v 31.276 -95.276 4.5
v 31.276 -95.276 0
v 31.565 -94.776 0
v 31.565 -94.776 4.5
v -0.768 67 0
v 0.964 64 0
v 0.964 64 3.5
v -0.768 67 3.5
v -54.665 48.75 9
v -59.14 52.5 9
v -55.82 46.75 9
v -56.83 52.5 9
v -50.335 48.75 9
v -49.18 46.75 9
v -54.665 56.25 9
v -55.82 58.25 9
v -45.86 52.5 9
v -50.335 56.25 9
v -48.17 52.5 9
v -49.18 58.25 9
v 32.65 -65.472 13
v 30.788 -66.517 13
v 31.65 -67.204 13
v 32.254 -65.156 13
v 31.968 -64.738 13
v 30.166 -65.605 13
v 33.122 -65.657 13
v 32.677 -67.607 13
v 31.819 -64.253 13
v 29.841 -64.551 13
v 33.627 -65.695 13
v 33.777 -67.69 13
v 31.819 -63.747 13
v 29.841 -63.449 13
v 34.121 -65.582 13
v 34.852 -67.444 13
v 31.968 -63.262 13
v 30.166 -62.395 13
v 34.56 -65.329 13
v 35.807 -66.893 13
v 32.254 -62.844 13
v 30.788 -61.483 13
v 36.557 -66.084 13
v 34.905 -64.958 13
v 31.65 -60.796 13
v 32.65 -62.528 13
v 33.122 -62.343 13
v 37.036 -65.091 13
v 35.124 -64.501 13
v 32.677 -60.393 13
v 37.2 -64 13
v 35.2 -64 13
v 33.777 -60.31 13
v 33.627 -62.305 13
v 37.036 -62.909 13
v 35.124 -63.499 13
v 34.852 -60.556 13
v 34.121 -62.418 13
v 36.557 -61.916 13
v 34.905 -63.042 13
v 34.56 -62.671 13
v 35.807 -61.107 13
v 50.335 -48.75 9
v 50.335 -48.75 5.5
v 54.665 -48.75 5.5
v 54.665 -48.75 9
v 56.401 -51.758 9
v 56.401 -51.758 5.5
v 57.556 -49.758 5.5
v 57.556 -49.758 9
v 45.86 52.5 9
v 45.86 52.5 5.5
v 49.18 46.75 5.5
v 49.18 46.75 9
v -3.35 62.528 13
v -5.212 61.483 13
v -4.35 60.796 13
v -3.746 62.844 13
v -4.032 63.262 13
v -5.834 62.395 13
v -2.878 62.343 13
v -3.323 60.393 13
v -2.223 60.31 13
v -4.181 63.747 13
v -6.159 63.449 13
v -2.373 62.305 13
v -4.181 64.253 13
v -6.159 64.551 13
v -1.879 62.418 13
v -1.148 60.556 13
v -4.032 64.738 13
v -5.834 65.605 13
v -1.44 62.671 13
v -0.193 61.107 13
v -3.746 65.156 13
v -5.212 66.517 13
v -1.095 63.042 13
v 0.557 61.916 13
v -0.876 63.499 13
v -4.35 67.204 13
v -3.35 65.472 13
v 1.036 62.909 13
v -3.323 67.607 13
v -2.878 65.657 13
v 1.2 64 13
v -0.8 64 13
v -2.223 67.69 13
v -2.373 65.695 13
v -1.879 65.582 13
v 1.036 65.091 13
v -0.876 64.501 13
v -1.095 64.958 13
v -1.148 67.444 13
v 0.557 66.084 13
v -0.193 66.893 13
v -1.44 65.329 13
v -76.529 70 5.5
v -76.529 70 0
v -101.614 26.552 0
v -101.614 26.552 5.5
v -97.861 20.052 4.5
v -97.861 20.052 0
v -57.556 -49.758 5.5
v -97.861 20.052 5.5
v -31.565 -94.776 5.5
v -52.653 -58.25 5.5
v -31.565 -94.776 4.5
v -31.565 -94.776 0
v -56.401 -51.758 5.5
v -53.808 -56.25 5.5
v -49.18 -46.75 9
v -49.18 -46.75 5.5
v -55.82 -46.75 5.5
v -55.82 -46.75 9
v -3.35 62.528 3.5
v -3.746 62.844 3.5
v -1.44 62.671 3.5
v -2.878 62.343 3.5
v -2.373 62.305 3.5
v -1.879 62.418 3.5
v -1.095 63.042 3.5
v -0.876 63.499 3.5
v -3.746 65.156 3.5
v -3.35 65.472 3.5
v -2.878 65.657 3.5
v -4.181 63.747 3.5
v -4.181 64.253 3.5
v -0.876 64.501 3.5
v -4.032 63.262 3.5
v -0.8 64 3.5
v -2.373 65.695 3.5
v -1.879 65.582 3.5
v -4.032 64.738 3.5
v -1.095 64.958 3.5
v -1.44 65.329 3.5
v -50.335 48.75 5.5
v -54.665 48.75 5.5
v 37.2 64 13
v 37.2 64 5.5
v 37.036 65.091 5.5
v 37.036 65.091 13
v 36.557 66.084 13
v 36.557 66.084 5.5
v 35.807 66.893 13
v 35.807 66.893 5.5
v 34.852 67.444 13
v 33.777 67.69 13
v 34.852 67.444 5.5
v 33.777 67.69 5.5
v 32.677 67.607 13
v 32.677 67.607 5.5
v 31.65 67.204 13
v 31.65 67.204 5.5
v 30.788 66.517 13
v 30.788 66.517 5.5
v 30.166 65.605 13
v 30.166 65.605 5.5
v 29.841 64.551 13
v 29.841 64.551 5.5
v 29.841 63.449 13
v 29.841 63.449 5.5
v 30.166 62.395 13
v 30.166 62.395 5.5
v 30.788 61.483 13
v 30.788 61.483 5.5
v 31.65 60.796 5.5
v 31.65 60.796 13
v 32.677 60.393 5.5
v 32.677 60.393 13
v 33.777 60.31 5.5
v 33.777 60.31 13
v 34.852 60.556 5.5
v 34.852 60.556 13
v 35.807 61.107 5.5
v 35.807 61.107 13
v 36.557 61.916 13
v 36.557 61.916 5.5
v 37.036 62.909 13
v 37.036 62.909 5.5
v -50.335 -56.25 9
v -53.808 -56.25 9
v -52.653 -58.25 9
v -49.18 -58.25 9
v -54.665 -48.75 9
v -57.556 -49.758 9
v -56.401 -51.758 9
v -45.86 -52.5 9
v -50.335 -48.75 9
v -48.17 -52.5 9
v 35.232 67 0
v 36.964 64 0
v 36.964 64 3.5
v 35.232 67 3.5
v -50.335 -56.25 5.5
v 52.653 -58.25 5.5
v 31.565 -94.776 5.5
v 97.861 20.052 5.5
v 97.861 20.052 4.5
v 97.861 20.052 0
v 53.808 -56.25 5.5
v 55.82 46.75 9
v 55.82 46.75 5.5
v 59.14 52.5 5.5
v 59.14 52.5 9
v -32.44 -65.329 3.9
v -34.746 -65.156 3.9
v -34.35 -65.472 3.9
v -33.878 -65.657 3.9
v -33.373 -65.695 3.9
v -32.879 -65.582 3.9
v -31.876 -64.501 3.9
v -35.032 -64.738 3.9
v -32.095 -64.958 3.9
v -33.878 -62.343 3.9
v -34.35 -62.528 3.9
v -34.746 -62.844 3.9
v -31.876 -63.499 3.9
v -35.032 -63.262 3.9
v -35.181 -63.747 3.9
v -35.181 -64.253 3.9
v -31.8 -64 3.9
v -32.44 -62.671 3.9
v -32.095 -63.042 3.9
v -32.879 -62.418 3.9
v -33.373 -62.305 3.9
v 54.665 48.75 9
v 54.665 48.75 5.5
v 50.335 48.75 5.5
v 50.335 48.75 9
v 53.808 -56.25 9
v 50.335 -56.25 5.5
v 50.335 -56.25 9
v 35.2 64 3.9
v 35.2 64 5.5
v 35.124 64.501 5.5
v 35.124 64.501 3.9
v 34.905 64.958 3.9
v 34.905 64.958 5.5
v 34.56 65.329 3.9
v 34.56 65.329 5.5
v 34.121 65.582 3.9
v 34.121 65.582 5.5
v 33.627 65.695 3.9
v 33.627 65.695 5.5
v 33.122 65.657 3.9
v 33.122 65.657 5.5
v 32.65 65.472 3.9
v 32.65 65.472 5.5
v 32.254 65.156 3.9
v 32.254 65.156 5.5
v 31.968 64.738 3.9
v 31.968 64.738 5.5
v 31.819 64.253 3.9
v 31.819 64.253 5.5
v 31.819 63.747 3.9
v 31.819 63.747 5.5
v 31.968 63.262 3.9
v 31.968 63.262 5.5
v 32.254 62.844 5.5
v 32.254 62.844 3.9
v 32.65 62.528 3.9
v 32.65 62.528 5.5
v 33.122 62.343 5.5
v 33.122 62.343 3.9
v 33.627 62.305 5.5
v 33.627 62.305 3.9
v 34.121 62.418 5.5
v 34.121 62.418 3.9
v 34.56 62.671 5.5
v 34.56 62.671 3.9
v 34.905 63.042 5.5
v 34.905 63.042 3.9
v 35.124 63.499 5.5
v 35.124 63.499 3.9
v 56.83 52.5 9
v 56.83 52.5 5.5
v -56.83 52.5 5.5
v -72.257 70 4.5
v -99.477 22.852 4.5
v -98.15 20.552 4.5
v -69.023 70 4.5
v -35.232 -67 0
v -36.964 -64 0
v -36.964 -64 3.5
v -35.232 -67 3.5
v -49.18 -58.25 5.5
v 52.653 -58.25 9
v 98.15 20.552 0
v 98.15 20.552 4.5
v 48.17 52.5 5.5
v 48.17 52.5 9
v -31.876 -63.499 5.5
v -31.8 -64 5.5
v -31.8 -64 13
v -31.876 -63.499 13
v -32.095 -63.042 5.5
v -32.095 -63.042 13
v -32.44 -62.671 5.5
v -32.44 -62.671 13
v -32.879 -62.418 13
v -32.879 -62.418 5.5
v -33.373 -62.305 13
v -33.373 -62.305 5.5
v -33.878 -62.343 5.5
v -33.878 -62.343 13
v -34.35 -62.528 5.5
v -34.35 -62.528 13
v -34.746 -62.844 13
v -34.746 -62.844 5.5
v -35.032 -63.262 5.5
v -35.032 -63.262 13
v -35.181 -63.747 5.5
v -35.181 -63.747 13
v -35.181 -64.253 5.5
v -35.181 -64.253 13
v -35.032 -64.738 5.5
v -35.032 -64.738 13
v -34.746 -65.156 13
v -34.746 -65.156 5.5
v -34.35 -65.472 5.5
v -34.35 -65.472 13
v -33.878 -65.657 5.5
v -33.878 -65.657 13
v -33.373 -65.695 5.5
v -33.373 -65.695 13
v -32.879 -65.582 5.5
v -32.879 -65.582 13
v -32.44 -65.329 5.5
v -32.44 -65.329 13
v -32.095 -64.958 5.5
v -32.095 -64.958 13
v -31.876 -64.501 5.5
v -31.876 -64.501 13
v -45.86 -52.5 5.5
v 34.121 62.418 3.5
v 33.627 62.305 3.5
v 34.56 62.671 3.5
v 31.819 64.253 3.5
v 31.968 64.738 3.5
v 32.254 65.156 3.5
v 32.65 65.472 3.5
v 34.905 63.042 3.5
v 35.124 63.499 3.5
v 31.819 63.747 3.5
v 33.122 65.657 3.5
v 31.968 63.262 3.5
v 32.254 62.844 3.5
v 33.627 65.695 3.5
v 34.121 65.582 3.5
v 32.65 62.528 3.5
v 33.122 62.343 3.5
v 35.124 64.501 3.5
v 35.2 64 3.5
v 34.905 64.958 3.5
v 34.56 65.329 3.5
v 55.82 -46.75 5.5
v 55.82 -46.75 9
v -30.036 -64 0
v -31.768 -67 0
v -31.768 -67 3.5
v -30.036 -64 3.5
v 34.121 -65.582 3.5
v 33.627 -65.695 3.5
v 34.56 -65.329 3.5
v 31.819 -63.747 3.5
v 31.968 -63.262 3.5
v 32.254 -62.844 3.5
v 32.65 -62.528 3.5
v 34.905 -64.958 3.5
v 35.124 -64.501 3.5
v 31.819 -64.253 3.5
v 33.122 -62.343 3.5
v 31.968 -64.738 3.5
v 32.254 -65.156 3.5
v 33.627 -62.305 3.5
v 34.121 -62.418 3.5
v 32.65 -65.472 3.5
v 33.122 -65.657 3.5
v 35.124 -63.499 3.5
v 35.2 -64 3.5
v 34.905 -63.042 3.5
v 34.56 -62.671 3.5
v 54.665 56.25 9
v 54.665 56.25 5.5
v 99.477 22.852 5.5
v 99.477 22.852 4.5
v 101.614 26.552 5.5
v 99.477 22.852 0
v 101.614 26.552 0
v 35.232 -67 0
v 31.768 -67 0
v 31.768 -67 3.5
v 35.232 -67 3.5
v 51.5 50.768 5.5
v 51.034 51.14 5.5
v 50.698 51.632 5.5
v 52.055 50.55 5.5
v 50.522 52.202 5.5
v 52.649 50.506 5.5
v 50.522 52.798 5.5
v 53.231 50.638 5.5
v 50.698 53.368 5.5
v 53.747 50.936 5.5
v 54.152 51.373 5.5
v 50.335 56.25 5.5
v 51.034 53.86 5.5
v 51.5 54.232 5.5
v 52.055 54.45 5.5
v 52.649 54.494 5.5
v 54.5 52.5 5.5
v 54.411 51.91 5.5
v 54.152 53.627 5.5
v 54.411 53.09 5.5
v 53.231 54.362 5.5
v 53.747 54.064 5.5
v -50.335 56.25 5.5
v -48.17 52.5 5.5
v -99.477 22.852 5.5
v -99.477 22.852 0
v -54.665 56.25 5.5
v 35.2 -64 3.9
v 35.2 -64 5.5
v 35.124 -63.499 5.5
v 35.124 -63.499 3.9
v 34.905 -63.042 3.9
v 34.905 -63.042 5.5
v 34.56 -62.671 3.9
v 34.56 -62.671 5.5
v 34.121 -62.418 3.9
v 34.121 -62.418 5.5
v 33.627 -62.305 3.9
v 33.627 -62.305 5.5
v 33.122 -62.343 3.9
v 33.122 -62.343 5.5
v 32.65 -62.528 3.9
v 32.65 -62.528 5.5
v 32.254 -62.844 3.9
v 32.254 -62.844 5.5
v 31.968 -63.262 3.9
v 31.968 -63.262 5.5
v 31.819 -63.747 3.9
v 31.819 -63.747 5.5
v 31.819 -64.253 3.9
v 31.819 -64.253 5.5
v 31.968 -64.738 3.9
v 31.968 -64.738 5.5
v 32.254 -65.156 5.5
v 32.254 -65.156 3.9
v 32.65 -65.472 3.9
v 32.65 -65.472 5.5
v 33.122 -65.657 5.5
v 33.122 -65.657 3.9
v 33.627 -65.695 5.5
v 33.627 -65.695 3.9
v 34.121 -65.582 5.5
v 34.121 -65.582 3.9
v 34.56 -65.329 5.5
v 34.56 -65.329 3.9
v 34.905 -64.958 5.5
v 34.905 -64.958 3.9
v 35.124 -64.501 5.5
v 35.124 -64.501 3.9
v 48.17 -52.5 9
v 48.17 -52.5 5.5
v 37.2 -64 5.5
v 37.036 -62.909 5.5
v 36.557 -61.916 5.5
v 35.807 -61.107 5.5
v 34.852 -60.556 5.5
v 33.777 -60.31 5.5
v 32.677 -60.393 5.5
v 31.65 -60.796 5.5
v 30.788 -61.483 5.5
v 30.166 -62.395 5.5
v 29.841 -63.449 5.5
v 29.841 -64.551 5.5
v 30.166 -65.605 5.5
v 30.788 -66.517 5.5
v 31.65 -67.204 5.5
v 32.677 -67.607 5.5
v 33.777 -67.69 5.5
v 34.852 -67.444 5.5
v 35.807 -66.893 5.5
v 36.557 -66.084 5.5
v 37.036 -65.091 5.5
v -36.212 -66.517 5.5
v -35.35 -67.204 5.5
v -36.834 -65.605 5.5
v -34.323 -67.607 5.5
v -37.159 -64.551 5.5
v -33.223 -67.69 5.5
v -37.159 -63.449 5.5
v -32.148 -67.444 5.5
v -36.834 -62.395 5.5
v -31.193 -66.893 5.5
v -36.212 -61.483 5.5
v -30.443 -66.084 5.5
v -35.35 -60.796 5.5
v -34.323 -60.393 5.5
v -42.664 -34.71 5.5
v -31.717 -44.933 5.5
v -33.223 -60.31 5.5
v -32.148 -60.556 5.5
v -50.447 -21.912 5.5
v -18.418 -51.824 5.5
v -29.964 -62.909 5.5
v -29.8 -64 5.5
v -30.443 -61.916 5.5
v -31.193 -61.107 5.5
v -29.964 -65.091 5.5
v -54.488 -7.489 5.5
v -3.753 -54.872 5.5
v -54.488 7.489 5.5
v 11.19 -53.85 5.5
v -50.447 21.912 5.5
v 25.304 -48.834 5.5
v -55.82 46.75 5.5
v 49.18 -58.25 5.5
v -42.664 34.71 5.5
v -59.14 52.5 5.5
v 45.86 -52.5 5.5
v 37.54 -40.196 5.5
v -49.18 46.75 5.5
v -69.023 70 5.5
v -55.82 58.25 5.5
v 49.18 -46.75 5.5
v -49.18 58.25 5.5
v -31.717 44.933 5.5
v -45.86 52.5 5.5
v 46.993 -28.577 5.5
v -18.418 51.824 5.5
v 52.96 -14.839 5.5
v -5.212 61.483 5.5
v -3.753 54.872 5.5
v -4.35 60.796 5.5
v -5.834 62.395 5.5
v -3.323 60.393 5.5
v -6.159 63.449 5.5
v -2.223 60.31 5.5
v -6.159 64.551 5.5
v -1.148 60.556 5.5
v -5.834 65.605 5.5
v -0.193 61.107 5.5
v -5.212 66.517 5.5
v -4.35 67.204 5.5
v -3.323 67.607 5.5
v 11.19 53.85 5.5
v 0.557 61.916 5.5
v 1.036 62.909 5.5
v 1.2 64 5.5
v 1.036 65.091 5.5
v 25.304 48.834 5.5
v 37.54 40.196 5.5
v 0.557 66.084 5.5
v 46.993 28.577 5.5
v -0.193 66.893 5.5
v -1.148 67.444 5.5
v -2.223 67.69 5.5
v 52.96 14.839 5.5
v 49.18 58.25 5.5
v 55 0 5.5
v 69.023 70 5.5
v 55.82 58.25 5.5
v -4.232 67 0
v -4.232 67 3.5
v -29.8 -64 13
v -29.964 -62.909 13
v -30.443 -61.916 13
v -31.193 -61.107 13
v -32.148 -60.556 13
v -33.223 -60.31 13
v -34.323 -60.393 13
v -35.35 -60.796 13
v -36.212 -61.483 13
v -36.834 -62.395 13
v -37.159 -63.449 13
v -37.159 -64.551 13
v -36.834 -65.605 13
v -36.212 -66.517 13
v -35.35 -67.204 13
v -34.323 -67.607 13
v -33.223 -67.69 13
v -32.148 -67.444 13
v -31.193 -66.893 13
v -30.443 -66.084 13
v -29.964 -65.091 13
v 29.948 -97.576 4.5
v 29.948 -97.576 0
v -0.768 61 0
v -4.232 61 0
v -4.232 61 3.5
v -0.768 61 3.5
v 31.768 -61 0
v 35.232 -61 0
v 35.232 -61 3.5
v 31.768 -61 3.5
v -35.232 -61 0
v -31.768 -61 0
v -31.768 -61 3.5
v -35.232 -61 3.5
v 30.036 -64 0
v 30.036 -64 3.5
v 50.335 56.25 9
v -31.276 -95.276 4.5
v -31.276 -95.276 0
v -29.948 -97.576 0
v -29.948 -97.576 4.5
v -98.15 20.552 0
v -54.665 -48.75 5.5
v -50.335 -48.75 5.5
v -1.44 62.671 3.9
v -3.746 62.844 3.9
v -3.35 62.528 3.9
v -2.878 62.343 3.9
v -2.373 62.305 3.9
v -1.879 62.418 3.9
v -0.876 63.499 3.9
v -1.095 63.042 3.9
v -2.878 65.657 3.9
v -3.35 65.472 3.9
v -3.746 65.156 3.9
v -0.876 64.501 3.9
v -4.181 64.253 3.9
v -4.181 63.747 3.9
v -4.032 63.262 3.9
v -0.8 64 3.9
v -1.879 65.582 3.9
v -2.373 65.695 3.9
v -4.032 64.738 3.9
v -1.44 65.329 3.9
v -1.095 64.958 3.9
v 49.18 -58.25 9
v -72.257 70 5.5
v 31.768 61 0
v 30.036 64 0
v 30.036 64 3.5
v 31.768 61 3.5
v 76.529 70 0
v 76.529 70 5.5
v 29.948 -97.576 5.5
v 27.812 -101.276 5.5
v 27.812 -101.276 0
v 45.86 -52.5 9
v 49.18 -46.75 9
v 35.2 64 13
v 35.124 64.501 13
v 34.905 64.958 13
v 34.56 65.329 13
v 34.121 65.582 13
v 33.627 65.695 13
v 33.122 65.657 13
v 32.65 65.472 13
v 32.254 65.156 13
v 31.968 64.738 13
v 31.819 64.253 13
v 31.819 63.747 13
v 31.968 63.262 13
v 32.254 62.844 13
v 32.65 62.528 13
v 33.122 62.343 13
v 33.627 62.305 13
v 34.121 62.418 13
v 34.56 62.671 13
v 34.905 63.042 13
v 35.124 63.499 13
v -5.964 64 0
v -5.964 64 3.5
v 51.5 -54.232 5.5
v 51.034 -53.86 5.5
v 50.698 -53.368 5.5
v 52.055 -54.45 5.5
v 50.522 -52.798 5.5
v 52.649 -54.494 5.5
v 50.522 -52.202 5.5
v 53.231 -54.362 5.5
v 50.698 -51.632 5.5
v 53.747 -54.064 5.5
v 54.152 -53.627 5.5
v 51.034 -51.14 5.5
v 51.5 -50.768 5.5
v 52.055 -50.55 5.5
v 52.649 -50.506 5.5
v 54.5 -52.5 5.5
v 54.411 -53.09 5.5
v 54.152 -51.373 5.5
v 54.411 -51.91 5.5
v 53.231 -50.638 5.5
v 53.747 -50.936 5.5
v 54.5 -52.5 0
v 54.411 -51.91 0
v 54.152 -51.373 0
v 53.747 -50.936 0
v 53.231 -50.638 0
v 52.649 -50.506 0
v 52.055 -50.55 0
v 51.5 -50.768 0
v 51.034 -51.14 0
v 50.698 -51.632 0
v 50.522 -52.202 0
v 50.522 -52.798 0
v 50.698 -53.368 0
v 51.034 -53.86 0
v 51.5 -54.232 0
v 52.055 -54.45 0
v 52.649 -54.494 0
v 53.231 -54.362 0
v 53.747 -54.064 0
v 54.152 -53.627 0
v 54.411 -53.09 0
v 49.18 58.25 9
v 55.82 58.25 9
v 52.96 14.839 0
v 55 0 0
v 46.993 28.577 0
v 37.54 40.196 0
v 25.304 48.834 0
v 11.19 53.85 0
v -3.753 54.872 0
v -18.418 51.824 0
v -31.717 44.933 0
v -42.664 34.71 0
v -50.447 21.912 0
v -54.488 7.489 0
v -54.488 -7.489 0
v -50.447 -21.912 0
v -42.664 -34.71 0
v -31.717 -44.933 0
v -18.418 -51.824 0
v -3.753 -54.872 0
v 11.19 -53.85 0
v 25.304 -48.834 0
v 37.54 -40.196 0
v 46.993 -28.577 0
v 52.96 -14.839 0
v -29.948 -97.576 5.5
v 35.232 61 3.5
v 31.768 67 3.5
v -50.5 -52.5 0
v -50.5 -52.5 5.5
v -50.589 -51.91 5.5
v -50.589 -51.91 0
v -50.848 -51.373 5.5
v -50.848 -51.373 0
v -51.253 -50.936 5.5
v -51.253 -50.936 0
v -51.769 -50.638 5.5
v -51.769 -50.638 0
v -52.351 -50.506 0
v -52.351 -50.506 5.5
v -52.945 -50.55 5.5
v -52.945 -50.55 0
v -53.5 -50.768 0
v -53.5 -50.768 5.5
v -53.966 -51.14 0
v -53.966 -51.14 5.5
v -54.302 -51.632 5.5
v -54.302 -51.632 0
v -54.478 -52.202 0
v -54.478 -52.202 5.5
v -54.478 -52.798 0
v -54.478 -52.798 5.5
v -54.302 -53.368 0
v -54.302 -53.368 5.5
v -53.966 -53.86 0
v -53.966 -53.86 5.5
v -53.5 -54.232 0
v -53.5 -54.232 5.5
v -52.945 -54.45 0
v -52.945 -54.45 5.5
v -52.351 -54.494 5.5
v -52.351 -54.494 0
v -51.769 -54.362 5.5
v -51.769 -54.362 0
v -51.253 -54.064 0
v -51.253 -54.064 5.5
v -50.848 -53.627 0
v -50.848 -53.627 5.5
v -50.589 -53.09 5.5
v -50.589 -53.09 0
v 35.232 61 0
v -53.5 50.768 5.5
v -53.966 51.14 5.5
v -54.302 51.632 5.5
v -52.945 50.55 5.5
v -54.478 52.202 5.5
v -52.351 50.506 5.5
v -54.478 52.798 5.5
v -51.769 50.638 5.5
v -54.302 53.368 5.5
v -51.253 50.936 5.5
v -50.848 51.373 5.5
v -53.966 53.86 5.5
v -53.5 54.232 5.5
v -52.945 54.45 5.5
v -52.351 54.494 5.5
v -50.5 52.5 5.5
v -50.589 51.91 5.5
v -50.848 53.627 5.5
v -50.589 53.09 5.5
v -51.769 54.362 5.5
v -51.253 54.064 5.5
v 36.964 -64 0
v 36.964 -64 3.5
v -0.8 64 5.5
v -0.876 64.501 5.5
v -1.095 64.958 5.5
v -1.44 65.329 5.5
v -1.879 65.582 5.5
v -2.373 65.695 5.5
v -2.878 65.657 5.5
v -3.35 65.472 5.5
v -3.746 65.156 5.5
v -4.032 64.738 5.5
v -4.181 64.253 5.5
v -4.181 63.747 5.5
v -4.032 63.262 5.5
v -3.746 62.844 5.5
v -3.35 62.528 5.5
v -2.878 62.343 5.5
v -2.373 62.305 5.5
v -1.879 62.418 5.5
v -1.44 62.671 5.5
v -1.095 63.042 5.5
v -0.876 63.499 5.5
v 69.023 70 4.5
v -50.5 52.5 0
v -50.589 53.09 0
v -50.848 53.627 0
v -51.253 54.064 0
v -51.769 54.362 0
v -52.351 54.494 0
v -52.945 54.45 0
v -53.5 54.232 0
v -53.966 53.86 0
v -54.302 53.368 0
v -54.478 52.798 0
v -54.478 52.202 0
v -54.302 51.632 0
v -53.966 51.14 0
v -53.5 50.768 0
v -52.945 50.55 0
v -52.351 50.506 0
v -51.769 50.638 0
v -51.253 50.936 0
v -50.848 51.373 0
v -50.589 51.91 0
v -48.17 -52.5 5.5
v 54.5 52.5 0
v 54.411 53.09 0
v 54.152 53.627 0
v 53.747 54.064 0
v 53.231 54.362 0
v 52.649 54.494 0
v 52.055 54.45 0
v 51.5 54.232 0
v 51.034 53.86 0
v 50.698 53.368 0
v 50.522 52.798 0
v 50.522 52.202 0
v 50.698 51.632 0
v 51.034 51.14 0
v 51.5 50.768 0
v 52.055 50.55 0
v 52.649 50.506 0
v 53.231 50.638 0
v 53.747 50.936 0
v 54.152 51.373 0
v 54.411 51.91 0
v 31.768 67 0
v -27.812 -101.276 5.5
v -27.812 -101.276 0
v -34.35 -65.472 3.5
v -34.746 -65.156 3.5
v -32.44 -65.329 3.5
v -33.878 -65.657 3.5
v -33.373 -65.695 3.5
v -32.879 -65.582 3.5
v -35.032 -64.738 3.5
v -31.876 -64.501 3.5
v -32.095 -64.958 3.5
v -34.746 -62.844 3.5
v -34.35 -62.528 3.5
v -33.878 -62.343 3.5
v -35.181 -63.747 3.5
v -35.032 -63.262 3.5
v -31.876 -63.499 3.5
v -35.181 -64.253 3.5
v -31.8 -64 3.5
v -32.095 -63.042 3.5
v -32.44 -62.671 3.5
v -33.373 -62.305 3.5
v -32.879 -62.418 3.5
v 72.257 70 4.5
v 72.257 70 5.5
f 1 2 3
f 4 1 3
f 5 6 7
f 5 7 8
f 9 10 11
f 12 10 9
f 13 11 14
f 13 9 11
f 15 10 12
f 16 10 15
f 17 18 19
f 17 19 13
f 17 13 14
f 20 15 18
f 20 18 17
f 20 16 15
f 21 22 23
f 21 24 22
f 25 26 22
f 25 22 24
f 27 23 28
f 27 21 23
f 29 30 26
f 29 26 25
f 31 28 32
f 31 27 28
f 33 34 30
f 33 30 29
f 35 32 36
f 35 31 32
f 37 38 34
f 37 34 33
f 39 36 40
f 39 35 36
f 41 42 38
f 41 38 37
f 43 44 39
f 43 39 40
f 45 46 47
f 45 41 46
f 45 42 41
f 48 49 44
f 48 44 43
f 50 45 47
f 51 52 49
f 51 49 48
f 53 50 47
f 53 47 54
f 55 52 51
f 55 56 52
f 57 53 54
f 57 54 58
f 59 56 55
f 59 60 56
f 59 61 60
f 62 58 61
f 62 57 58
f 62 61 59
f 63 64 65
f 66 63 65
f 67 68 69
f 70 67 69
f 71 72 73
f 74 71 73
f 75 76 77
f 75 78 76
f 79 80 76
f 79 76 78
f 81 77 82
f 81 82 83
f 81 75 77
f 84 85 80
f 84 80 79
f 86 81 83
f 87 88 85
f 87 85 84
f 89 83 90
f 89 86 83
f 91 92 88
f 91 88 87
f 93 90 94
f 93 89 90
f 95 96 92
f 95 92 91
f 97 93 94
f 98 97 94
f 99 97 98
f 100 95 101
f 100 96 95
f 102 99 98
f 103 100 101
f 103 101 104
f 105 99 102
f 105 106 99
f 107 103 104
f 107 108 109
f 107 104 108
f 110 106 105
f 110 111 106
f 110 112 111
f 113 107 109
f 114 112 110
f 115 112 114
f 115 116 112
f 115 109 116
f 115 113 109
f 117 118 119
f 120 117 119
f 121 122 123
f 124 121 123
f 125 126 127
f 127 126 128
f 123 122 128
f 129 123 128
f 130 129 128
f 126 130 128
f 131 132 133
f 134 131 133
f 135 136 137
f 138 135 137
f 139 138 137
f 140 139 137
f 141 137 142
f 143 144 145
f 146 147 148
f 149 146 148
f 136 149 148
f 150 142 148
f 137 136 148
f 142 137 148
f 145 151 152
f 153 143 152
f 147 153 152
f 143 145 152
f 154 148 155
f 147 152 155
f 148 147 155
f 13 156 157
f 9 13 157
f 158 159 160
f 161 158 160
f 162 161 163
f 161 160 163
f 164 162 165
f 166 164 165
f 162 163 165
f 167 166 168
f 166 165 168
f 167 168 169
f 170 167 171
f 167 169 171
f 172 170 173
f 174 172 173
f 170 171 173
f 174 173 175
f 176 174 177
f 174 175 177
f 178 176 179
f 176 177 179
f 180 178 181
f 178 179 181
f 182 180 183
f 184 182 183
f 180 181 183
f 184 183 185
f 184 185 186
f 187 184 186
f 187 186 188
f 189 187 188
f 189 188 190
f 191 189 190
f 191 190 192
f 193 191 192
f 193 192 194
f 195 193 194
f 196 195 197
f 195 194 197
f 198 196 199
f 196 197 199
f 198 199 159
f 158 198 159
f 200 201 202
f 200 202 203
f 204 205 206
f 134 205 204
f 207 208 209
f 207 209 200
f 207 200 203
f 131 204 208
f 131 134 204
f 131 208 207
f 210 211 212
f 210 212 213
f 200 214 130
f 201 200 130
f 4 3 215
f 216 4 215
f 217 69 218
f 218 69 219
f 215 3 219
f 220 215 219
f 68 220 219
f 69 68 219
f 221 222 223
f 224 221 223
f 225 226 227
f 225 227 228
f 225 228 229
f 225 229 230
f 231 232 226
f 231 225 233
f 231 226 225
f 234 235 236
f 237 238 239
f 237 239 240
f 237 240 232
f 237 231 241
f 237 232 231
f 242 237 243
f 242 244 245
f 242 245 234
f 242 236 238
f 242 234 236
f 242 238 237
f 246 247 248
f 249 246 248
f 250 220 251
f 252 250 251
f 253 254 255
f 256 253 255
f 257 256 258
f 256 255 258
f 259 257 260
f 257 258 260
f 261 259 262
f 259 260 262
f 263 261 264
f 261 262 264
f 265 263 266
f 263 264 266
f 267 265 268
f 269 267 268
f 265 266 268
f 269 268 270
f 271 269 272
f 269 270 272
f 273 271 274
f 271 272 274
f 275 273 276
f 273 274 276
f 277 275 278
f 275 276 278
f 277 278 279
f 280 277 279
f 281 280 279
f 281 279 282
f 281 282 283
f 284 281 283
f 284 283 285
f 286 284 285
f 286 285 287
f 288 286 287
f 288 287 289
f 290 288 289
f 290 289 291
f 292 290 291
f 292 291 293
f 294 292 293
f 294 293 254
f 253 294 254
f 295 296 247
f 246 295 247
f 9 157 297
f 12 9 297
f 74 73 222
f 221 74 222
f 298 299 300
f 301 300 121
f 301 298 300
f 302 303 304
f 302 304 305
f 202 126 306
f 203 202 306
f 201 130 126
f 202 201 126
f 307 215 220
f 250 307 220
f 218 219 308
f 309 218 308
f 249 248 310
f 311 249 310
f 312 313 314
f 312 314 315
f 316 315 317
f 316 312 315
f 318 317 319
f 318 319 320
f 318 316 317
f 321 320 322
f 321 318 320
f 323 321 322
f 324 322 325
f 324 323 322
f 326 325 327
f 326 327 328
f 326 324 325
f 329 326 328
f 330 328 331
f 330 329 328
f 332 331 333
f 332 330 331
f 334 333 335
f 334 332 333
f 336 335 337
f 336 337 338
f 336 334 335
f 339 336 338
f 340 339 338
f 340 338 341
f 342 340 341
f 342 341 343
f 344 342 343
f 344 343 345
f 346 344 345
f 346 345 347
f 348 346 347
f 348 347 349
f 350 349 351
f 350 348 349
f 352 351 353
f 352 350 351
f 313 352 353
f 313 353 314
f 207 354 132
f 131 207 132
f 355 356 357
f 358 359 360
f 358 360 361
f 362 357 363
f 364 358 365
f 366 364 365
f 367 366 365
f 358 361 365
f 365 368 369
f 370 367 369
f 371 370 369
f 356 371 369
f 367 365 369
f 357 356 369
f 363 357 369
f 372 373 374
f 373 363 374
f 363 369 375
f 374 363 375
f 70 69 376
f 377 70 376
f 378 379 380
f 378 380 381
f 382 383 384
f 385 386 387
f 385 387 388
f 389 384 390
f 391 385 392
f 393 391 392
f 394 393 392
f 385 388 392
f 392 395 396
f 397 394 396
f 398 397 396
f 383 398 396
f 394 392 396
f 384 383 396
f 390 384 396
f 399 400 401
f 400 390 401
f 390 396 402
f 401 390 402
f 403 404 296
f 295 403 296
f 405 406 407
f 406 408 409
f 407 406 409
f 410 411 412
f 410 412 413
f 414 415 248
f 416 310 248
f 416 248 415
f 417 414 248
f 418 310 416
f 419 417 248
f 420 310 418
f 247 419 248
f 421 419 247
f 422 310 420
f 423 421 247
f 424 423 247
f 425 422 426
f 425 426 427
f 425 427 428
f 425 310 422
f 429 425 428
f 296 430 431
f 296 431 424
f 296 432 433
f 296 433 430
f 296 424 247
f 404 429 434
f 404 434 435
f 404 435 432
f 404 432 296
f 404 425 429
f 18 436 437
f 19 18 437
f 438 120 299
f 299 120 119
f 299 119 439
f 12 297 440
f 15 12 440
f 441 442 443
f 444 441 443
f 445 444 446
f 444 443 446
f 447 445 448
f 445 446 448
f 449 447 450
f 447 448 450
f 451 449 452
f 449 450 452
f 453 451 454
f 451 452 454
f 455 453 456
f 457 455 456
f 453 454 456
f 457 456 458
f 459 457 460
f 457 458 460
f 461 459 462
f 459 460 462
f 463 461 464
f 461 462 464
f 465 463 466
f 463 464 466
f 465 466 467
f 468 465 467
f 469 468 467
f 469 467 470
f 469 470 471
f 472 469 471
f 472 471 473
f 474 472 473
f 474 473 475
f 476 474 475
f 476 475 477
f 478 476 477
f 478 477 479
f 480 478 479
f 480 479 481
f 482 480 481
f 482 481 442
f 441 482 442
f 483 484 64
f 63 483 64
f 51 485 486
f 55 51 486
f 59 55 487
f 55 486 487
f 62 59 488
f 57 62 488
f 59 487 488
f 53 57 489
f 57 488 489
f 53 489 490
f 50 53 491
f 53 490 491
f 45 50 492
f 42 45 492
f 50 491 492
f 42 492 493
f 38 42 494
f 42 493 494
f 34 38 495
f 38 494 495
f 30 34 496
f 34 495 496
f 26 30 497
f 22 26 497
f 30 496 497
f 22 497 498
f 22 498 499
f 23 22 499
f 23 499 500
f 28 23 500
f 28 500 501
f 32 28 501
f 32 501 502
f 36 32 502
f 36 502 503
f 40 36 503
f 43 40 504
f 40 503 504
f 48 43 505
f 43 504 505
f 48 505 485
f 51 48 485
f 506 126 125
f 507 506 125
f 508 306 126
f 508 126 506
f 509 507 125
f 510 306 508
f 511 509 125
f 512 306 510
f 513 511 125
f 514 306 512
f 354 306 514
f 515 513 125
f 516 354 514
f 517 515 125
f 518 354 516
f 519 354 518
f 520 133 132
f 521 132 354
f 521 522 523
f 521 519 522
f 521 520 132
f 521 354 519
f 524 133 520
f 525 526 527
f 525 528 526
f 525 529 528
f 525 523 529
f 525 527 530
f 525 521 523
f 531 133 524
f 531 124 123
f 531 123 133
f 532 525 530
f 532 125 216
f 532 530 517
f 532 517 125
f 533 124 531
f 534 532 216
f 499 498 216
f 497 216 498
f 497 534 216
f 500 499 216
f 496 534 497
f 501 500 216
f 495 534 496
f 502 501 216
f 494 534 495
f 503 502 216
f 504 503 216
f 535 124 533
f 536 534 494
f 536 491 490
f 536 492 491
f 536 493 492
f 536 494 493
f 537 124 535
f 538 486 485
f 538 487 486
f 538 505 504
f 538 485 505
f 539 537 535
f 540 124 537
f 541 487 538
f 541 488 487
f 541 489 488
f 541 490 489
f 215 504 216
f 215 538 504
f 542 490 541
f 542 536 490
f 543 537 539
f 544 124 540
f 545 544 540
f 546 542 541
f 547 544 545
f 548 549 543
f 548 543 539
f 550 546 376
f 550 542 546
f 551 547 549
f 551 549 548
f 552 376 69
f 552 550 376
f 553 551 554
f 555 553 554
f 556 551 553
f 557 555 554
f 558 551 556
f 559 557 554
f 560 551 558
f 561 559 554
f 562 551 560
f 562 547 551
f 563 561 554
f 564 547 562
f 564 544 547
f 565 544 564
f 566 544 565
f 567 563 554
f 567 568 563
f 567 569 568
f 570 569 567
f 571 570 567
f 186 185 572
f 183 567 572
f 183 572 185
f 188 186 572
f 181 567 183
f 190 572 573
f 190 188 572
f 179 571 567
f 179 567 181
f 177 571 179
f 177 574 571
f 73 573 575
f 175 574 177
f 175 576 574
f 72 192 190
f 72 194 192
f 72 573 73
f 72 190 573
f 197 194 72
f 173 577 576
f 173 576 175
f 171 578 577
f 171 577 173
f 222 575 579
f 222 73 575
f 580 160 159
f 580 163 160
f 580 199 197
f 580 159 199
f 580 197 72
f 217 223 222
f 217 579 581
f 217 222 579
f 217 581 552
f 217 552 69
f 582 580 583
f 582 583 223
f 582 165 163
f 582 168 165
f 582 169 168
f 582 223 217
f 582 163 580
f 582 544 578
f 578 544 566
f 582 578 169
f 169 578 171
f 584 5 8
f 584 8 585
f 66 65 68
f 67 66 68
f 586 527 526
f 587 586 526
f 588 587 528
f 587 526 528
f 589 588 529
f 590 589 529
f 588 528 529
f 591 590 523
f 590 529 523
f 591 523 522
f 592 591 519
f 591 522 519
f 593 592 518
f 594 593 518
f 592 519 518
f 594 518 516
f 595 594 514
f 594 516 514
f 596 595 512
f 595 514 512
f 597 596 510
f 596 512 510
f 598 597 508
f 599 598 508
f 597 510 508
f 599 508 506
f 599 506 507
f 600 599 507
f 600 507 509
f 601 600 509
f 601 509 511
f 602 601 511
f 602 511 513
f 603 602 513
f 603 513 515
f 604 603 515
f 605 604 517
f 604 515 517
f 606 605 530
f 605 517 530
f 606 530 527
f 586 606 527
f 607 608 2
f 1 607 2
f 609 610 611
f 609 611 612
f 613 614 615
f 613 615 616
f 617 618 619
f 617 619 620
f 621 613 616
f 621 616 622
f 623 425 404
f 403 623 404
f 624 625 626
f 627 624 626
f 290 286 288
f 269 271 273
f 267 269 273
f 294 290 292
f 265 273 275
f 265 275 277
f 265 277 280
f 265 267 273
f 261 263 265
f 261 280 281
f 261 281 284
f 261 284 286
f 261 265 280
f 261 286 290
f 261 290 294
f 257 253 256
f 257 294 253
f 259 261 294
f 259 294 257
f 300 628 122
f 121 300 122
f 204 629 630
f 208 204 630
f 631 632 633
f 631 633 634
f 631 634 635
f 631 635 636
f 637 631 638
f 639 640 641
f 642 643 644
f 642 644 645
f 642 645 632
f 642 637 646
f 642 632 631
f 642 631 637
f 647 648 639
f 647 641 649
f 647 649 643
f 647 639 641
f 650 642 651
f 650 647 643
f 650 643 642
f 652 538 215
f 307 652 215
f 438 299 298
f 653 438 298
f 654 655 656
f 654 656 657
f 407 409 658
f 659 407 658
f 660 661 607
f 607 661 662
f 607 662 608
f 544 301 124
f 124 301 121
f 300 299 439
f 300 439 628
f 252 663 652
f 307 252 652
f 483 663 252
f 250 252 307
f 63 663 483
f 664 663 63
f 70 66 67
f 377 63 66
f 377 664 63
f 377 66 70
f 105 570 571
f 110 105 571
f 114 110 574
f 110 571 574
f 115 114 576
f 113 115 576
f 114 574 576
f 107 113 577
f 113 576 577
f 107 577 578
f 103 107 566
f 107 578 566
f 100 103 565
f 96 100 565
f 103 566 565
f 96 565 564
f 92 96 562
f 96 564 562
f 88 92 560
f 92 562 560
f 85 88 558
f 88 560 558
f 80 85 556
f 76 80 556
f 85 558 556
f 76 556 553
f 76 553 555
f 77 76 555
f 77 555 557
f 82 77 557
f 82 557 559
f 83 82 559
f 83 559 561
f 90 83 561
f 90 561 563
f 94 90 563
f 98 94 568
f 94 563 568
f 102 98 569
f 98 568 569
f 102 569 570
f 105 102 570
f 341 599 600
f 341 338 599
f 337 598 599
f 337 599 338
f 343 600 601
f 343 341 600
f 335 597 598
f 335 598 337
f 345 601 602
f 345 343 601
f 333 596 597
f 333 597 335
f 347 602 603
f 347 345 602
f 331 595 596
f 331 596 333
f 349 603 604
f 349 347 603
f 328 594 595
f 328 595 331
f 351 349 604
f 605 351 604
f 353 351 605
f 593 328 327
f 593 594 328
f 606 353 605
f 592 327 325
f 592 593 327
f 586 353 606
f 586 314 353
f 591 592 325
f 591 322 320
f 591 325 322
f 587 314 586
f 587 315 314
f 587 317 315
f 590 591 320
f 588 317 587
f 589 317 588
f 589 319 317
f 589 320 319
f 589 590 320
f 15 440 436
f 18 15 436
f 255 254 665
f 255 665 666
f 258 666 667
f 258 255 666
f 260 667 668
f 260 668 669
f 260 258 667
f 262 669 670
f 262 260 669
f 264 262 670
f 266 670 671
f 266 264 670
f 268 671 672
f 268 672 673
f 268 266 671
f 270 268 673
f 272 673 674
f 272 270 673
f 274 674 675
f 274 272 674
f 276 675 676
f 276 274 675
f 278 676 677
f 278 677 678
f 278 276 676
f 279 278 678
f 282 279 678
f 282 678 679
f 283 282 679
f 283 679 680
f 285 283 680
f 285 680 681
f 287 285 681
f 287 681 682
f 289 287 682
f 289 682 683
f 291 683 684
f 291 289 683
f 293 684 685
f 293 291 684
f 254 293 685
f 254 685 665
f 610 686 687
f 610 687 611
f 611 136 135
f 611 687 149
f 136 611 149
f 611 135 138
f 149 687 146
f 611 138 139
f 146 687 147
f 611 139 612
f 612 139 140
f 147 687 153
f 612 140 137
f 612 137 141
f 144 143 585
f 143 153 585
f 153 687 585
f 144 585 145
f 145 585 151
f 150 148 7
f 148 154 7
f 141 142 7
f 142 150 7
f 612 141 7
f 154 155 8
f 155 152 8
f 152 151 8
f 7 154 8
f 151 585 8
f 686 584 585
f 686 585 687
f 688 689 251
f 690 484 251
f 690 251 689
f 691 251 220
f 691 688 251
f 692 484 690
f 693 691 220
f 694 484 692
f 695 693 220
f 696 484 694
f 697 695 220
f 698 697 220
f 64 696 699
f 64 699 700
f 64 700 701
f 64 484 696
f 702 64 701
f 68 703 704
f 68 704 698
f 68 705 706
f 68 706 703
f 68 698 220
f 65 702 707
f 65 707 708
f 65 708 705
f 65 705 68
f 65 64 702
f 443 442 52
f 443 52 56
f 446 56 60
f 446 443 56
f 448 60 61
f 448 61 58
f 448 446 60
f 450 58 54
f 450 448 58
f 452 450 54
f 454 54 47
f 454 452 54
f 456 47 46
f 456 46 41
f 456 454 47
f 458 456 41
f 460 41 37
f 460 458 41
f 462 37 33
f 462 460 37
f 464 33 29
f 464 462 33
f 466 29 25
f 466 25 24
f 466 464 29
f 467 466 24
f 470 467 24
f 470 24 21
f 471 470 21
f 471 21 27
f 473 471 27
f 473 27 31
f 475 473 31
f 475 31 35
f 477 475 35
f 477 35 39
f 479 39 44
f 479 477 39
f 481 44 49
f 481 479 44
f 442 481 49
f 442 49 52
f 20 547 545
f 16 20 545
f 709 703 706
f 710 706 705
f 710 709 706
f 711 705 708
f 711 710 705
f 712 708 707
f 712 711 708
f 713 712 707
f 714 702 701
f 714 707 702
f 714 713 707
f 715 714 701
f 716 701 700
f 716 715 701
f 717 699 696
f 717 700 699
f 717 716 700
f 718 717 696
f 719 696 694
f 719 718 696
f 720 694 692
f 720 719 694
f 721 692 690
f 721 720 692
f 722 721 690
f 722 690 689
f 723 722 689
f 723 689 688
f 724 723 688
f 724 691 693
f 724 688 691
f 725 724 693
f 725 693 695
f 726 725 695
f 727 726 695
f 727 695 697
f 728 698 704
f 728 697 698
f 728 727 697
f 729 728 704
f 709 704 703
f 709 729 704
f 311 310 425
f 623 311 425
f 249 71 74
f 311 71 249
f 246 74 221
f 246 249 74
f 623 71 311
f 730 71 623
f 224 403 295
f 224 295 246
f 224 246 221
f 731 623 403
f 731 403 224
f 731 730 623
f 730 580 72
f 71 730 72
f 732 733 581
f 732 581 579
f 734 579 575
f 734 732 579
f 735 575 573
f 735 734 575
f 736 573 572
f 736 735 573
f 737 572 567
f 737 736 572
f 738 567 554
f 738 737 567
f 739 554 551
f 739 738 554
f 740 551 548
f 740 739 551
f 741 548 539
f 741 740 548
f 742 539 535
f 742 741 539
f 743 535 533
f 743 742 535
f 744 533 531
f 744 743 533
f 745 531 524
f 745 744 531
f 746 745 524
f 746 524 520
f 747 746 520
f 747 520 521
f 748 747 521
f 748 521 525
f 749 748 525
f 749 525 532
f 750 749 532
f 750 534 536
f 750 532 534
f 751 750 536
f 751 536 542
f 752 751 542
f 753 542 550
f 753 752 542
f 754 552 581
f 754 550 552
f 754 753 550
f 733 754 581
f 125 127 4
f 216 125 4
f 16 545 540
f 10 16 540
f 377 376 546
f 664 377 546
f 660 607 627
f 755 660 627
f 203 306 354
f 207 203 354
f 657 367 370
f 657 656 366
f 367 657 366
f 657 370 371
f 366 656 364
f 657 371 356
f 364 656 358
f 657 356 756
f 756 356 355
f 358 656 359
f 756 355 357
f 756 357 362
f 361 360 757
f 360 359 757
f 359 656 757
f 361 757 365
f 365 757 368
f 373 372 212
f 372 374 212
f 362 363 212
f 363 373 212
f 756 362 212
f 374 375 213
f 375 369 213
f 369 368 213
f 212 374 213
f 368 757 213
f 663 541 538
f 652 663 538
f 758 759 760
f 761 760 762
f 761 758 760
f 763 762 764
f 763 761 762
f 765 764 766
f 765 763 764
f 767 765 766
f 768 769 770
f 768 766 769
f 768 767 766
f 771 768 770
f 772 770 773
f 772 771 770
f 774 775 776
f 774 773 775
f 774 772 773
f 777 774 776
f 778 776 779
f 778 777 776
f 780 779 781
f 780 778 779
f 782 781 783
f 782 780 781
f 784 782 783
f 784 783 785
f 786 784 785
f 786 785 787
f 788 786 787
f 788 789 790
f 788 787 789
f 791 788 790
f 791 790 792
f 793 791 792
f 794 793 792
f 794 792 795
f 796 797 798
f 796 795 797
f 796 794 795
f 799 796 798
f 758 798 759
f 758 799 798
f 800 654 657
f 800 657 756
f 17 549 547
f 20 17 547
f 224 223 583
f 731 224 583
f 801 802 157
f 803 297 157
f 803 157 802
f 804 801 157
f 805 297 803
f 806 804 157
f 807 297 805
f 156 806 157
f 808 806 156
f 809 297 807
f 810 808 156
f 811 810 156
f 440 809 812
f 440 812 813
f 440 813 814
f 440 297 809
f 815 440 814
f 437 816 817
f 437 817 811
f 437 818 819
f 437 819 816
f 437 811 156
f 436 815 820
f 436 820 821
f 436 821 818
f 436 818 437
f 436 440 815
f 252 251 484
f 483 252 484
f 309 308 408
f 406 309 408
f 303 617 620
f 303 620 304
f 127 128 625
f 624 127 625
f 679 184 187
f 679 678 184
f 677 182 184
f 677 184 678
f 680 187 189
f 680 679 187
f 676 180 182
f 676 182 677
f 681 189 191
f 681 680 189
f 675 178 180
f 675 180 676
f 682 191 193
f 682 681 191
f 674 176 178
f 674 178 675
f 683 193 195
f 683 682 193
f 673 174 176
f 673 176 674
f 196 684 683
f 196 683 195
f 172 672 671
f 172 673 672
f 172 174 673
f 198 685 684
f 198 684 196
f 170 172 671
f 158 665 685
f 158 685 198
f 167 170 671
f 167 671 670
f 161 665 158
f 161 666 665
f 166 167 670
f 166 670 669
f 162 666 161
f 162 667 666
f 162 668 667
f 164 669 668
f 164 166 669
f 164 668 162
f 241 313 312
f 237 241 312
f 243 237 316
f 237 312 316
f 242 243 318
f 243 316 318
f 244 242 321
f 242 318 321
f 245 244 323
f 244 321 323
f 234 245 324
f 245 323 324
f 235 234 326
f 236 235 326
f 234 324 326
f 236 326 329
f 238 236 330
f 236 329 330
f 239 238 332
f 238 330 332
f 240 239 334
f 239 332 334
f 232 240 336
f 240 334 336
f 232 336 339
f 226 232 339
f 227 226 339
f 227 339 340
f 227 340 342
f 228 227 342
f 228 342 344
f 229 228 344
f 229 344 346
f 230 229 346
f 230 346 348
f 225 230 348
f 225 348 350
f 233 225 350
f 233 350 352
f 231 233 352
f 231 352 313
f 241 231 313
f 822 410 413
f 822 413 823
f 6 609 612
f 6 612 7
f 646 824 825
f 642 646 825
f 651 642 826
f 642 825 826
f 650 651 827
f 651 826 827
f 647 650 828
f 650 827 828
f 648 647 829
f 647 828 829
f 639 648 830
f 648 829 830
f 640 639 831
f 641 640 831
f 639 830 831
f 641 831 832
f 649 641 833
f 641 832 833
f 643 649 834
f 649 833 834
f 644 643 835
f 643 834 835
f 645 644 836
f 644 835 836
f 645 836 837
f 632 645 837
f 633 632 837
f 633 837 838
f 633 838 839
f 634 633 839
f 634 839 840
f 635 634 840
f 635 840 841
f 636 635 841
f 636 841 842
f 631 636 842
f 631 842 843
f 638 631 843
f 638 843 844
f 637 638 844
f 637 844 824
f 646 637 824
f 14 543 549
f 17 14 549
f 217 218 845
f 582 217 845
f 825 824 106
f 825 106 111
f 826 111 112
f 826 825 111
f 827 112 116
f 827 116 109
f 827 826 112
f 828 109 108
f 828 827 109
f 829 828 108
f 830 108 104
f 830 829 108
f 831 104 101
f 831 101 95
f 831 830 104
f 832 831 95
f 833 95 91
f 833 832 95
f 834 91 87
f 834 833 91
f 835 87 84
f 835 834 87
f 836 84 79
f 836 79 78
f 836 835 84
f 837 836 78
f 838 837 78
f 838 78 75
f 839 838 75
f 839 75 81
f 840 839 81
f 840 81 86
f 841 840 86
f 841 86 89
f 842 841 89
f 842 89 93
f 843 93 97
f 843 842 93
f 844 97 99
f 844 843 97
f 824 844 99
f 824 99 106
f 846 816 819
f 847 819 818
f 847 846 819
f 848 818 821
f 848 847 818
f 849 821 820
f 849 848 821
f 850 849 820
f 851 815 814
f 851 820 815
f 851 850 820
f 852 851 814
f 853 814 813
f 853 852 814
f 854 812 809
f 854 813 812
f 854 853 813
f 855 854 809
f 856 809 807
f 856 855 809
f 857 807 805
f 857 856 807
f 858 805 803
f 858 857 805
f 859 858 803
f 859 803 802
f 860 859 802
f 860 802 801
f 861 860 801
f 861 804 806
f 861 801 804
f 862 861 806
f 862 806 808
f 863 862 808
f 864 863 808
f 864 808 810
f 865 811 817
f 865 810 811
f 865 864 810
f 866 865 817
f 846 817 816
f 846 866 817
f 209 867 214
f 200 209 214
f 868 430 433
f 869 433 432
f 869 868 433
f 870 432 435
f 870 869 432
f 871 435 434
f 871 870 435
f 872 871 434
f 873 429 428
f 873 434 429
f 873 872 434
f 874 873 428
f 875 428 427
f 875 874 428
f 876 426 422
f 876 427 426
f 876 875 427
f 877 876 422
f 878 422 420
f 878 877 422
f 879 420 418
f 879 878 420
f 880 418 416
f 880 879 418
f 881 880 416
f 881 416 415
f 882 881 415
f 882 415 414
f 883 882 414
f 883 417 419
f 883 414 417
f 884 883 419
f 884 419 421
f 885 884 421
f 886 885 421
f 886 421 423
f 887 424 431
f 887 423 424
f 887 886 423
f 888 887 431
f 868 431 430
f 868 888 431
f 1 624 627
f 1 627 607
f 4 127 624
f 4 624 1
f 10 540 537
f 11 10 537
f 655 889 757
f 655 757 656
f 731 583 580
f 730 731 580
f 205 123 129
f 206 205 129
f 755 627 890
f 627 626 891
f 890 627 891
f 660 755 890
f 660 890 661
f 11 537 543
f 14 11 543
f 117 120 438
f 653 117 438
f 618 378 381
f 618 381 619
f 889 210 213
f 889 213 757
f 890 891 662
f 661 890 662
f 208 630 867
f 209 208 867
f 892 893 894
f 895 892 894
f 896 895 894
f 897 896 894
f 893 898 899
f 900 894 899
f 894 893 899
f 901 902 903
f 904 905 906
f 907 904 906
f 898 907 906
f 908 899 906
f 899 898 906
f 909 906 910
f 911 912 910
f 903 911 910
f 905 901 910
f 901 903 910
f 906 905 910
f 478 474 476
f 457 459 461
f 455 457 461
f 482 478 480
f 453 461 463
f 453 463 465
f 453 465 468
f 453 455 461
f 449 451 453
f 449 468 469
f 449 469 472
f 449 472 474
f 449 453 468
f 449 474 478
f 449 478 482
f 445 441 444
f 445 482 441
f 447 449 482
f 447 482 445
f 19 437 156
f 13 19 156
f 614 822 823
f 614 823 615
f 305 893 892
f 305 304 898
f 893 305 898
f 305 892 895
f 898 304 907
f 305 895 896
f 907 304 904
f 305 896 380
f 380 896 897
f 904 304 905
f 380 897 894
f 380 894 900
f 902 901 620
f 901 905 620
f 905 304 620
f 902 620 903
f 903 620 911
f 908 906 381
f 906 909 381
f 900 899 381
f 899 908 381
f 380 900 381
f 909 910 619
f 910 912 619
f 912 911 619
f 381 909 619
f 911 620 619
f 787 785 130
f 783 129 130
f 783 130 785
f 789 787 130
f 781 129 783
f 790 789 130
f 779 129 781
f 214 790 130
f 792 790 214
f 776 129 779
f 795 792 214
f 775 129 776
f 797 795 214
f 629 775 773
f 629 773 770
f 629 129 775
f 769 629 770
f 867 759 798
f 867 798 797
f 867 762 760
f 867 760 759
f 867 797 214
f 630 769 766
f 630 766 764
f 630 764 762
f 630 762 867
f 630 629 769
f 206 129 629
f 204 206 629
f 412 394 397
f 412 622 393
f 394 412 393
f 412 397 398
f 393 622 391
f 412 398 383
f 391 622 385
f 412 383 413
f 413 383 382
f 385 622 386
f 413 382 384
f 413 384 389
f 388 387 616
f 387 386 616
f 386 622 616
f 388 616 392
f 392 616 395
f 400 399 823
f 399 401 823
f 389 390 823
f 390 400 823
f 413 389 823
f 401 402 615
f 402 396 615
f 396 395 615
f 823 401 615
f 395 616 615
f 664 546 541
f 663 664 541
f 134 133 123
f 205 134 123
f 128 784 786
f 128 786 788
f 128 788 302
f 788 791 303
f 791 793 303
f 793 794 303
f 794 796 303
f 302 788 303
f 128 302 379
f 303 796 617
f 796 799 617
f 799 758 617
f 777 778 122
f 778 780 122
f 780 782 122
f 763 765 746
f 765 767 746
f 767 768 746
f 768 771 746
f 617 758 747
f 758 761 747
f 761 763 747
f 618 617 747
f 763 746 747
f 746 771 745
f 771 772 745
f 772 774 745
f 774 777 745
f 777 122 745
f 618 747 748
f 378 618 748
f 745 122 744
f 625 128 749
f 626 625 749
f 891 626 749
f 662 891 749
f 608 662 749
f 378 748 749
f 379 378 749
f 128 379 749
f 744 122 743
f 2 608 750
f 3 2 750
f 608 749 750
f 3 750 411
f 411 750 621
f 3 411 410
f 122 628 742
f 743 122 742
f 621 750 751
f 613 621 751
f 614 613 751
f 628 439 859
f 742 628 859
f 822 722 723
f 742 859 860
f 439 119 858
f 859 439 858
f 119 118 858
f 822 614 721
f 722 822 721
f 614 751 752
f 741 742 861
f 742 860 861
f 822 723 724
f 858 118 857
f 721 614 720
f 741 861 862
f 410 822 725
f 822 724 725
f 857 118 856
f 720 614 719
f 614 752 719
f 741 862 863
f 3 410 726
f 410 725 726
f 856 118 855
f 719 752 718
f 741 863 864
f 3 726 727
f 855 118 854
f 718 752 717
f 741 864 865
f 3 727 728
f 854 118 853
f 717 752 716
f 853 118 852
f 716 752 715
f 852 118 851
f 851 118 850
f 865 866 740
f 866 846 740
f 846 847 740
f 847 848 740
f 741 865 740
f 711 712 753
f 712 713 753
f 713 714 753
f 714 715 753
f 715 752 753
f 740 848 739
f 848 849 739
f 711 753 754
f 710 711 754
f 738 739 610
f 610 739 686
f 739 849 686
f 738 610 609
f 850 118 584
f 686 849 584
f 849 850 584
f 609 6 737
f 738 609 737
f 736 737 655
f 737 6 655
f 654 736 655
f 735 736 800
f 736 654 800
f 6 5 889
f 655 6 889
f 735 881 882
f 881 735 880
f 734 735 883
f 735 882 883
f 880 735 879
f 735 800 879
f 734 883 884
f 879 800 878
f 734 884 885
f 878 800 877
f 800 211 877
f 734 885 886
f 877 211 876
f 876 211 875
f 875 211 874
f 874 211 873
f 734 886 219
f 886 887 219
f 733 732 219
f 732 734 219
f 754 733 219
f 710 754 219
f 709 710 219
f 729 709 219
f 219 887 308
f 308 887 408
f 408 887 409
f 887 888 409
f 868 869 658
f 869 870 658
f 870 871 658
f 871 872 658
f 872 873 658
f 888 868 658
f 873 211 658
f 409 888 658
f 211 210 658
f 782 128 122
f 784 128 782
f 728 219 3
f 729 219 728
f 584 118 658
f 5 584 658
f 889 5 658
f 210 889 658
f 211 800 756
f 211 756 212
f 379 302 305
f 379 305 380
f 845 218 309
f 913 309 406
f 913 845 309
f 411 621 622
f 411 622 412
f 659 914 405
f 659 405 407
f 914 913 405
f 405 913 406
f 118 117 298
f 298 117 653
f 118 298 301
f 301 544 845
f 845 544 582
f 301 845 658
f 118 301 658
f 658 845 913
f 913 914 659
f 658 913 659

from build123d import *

# Parameters (mm, degrees)
F2_DEPTH      = 5.5
F3_DEPTH      = 4.5
F4_R          = 3.7
F4_R_2        = 1.7
F5_DEPTH      = 7.5
F6_DEPTH      = 25
F7_R          = 2
F7_R_2        = 55
F8_DEPTH      = 25
F9_DEPTH      = 7.5
F9_DEPTH_BACK = 2
F10_START     = -1.6
F10_DEPTH     = 0.4
F12_DEPTH     = 3.5
F14_W         = 250.9568184614
F14_H         = 134.5421932638
F15_DEPTH     = 25


with BuildPart() as f2:
    # F1 (on face) → F2 (new body)
    with BuildSketch(Plane.XY):
        Polygon((-66.2961039686, 74.7239265275), (-97.8608706276, 20.052146945), (-31.5647666591, -94.7760734725), (31.5647666591, -94.7760734725), (97.8608706276, 20.052146945), (66.2961039686, 74.7239265275), align=None)
    extrude(amount=F2_DEPTH)



with BuildPart() as f2b:
    # F1 (on face) → F2, piece 2 (new body)
    with BuildSketch(Plane.XY):
        Polygon((73.801657468, 74.7239265275), (69.529265476, 74.7239265275), (99.4774513814, 22.852146945), (101.6136473774, 26.552146945), align=None)
    extrude(amount=F2_DEPTH)


with BuildPart() as f2c:
    # F1 (on face) → F2, piece 3 (new body)
    with BuildSketch(Plane.XY):
        Polygon((29.9481859053, -97.5760734725), (-29.9481859053, -97.5760734725), (-27.8119899093, -101.2760734725), (27.8119899093, -101.2760734725), align=None)
    extrude(amount=F2_DEPTH)


with BuildPart() as f2d:
    # F1 (on face) → F2, piece 4 (new body)
    with BuildSketch(Plane.XY):
        Polygon((-73.801657468, 74.7239265275), (-101.6136473774, 26.552146945), (-99.4774513814, 22.852146945), (-69.529265476, 74.7239265275), align=None)
    extrude(amount=F2_DEPTH)


with BuildPart() as f2_1:
    add(f2.part)

    add(f2b.part)  # F3 merges F2b

    add(f2c.part)  # F3 merges F2c

    add(f2d.part)  # F3 merges F2d
    # F1 (on face) → F3 (join)
    with BuildSketch(Plane.XY):
        Polygon((-69.529265476, 74.7239265275), (-99.4774513814, 22.852146945), (-98.1495457622, 20.552146945), (-66.8734542378, 74.7239265275), align=None)
        Polygon((31.2760915245, -95.2760734725), (-31.2760915245, -95.2760734725), (-29.9481859053, -97.5760734725), (29.9481859053, -97.5760734725), align=None)
        Polygon((31.5647666591, -94.7760734725), (-31.5647666591, -94.7760734725), (-31.2760915245, -95.2760734725), (31.2760915245, -95.2760734725), align=None)
        Polygon((66.8734542378, 74.7239265275), (66.2961039686, 74.7239265275), (97.8608706276, 20.052146945), (98.1495457622, 20.552146945), align=None)
        Polygon((69.529265476, 74.7239265275), (66.8734542378, 74.7239265275), (98.1495457622, 20.552146945), (99.4774513814, 22.852146945), align=None)
        Polygon((-66.8734542378, 74.7239265275), (-98.1495457622, 20.552146945), (-97.8608706276, 20.052146945), (-66.2961039686, 74.7239265275), align=None)
    extrude(amount=F3_DEPTH)

    # F4 (on face) → F5 (join)
    with BuildSketch(Plane.XY.offset(5.5)):
        with Locations((33.5, 64)):
            Circle(F4_R)
        with Locations((33.5, 64)):
            Circle(F4_R_2, mode=Mode.SUBTRACT)
        with Locations((-2.5, 64)):
            Circle(F4_R)
        with Locations((-2.5, 64)):
            Circle(F4_R_2, mode=Mode.SUBTRACT)
        with Locations((33.5, -64)):
            Circle(F4_R)
        with Locations((33.5, -64)):
            Circle(F4_R_2, mode=Mode.SUBTRACT)
        with Locations((-33.5, -64)):
            Circle(F4_R)
        with Locations((-33.5, -64)):
            Circle(F4_R_2, mode=Mode.SUBTRACT)
    extrude(amount=F5_DEPTH)

    # F6 (cut): faces of the model
    f6_faces = [f2_1.faces().sort_by_distance(p)[0] for p in [
        (-33.5, -64, 5.5),
        (33.5, -64, 5.5),
        (-2.5, 64, 5.5),
        (33.5, 64, 5.5),
    ]]
    extrude(f6_faces, amount=-F6_DEPTH, mode=Mode.SUBTRACT)

    # F7 (on face) → F8 (cut)
    with BuildSketch(Plane.XY):
        with Locations((52.5, 52.5)):
            Circle(F7_R)
        with Locations((52.5, -52.5)):
            Circle(F7_R)
        with Locations((-52.5, -52.5)):
            Circle(F7_R)
        with Locations((-52.5, 52.5)):
            Circle(F7_R)
        Circle(F7_R_2)
        Polygon((-31.7679491924, -67), (-30.0358983849, -64), (-31.7679491924, -61), (-35.2320508076, -61), (-36.9641016151, -64), (-35.2320508076, -67), align=None)
        Polygon((31.7679491924, -67), (35.2320508076, -67), (36.9641016151, -64), (35.2320508076, -61), (31.7679491924, -61), (30.0358983849, -64), align=None)
        Polygon((-4.2320508076, 61), (-0.7679491924, 61), (0.9641016151, 64), (-0.7679491924, 67), (-4.2320508076, 67), (-5.9641016151, 64), align=None)
        Polygon((31.7679491924, 61), (35.2320508076, 61), (36.9641016151, 64), (35.2320508076, 67), (31.7679491924, 67), (30.0358983849, 64), align=None)
    extrude(amount=F8_DEPTH, mode=Mode.SUBTRACT)

    # F4 (on face) → F9 (join, two sides)
    with BuildSketch(Plane.XY.offset(5.5)) as f9_sk:
        with Locations((33.5, 64)):
            Circle(F4_R)
        with Locations((33.5, 64)):
            Circle(F4_R_2, mode=Mode.SUBTRACT)
        with Locations((-2.5, 64)):
            Circle(F4_R)
        with Locations((-2.5, 64)):
            Circle(F4_R_2, mode=Mode.SUBTRACT)
        with Locations((33.5, -64)):
            Circle(F4_R)
        with Locations((33.5, -64)):
            Circle(F4_R_2, mode=Mode.SUBTRACT)
        with Locations((-33.5, -64)):
            Circle(F4_R)
        with Locations((-33.5, -64)):
            Circle(F4_R_2, mode=Mode.SUBTRACT)
    extrude(amount=F9_DEPTH)
    extrude(f9_sk.sketch, amount=-F9_DEPTH_BACK)

    # F4 (on face) → F10 (join)
    with BuildSketch(Plane.XY.offset(5.5).offset(F10_START)):
        with Locations((33.5, 64)):
            Circle(F4_R_2)
        with Locations((-2.5, 64)):
            Circle(F4_R_2)
        with Locations((-33.5, -64)):
            Circle(F4_R_2)
        with Locations((33.5, -64)):
            Circle(F4_R_2)
    extrude(amount=-F10_DEPTH)

    # F11 (on face) → F12 (join)
    with BuildSketch(Plane.XY.offset(5.5)):
        Polygon((-56.4014980388, -51.7575928288), (-54.6650635095, -48.75), (-50.3349364905, -48.75), (-48.1698729811, -52.5), (-50.3349364905, -56.25), (-53.8078055492, -56.25), (-52.6531050108, -58.25), (-49.1802359522, -58.25), (-45.8604719043, -52.5), (-49.1802359522, -46.75), (-55.8197640478, -46.75), (-57.5561985772, -49.7575928288), align=None)
        Polygon((49.1802359522, -58.25), (52.6531050108, -58.25), (53.8078055492, -56.25), (50.3349364905, -56.25), (48.1698729811, -52.5), (50.3349364905, -48.75), (54.6650635095, -48.75), (56.4014980388, -51.7575928288), (57.5561985772, -49.7575928288), (55.8197640478, -46.75), (49.1802359522, -46.75), (45.8604719043, -52.5), align=None)
        Polygon((-55.8197640478, 46.75), (-49.1802359522, 46.75), (-45.8604719043, 52.5), (-49.1802359522, 58.25), (-55.8197640478, 58.25), (-59.1395280957, 52.5), align=None)
        Polygon((-48.1698729811, 52.5), (-50.3349364905, 48.75), (-54.6650635095, 48.75), (-56.8301270189, 52.5), (-54.6650635095, 56.25), (-50.3349364905, 56.25), align=None, mode=Mode.SUBTRACT)
        Polygon((49.1802359522, 46.75), (55.8197640478, 46.75), (59.1395280957, 52.5), (55.8197640478, 58.25), (49.1802359522, 58.25), (45.8604719043, 52.5), align=None)
        Polygon((56.8301270189, 52.5), (54.6650635095, 48.75), (50.3349364905, 48.75), (48.1698729811, 52.5), (50.3349364905, 56.25), (54.6650635095, 56.25), align=None, mode=Mode.SUBTRACT)
    extrude(amount=F12_DEPTH)

    # F14 (on offset) → F15 (cut)
    with BuildSketch(Plane.XZ.offset(-70)):
        with Locations((4.6517625451, 26.0684285313)):
            Rectangle(F14_W, F14_H)
    extrude(amount=-F15_DEPTH, mode=Mode.SUBTRACT)


solid = f2_1.part
